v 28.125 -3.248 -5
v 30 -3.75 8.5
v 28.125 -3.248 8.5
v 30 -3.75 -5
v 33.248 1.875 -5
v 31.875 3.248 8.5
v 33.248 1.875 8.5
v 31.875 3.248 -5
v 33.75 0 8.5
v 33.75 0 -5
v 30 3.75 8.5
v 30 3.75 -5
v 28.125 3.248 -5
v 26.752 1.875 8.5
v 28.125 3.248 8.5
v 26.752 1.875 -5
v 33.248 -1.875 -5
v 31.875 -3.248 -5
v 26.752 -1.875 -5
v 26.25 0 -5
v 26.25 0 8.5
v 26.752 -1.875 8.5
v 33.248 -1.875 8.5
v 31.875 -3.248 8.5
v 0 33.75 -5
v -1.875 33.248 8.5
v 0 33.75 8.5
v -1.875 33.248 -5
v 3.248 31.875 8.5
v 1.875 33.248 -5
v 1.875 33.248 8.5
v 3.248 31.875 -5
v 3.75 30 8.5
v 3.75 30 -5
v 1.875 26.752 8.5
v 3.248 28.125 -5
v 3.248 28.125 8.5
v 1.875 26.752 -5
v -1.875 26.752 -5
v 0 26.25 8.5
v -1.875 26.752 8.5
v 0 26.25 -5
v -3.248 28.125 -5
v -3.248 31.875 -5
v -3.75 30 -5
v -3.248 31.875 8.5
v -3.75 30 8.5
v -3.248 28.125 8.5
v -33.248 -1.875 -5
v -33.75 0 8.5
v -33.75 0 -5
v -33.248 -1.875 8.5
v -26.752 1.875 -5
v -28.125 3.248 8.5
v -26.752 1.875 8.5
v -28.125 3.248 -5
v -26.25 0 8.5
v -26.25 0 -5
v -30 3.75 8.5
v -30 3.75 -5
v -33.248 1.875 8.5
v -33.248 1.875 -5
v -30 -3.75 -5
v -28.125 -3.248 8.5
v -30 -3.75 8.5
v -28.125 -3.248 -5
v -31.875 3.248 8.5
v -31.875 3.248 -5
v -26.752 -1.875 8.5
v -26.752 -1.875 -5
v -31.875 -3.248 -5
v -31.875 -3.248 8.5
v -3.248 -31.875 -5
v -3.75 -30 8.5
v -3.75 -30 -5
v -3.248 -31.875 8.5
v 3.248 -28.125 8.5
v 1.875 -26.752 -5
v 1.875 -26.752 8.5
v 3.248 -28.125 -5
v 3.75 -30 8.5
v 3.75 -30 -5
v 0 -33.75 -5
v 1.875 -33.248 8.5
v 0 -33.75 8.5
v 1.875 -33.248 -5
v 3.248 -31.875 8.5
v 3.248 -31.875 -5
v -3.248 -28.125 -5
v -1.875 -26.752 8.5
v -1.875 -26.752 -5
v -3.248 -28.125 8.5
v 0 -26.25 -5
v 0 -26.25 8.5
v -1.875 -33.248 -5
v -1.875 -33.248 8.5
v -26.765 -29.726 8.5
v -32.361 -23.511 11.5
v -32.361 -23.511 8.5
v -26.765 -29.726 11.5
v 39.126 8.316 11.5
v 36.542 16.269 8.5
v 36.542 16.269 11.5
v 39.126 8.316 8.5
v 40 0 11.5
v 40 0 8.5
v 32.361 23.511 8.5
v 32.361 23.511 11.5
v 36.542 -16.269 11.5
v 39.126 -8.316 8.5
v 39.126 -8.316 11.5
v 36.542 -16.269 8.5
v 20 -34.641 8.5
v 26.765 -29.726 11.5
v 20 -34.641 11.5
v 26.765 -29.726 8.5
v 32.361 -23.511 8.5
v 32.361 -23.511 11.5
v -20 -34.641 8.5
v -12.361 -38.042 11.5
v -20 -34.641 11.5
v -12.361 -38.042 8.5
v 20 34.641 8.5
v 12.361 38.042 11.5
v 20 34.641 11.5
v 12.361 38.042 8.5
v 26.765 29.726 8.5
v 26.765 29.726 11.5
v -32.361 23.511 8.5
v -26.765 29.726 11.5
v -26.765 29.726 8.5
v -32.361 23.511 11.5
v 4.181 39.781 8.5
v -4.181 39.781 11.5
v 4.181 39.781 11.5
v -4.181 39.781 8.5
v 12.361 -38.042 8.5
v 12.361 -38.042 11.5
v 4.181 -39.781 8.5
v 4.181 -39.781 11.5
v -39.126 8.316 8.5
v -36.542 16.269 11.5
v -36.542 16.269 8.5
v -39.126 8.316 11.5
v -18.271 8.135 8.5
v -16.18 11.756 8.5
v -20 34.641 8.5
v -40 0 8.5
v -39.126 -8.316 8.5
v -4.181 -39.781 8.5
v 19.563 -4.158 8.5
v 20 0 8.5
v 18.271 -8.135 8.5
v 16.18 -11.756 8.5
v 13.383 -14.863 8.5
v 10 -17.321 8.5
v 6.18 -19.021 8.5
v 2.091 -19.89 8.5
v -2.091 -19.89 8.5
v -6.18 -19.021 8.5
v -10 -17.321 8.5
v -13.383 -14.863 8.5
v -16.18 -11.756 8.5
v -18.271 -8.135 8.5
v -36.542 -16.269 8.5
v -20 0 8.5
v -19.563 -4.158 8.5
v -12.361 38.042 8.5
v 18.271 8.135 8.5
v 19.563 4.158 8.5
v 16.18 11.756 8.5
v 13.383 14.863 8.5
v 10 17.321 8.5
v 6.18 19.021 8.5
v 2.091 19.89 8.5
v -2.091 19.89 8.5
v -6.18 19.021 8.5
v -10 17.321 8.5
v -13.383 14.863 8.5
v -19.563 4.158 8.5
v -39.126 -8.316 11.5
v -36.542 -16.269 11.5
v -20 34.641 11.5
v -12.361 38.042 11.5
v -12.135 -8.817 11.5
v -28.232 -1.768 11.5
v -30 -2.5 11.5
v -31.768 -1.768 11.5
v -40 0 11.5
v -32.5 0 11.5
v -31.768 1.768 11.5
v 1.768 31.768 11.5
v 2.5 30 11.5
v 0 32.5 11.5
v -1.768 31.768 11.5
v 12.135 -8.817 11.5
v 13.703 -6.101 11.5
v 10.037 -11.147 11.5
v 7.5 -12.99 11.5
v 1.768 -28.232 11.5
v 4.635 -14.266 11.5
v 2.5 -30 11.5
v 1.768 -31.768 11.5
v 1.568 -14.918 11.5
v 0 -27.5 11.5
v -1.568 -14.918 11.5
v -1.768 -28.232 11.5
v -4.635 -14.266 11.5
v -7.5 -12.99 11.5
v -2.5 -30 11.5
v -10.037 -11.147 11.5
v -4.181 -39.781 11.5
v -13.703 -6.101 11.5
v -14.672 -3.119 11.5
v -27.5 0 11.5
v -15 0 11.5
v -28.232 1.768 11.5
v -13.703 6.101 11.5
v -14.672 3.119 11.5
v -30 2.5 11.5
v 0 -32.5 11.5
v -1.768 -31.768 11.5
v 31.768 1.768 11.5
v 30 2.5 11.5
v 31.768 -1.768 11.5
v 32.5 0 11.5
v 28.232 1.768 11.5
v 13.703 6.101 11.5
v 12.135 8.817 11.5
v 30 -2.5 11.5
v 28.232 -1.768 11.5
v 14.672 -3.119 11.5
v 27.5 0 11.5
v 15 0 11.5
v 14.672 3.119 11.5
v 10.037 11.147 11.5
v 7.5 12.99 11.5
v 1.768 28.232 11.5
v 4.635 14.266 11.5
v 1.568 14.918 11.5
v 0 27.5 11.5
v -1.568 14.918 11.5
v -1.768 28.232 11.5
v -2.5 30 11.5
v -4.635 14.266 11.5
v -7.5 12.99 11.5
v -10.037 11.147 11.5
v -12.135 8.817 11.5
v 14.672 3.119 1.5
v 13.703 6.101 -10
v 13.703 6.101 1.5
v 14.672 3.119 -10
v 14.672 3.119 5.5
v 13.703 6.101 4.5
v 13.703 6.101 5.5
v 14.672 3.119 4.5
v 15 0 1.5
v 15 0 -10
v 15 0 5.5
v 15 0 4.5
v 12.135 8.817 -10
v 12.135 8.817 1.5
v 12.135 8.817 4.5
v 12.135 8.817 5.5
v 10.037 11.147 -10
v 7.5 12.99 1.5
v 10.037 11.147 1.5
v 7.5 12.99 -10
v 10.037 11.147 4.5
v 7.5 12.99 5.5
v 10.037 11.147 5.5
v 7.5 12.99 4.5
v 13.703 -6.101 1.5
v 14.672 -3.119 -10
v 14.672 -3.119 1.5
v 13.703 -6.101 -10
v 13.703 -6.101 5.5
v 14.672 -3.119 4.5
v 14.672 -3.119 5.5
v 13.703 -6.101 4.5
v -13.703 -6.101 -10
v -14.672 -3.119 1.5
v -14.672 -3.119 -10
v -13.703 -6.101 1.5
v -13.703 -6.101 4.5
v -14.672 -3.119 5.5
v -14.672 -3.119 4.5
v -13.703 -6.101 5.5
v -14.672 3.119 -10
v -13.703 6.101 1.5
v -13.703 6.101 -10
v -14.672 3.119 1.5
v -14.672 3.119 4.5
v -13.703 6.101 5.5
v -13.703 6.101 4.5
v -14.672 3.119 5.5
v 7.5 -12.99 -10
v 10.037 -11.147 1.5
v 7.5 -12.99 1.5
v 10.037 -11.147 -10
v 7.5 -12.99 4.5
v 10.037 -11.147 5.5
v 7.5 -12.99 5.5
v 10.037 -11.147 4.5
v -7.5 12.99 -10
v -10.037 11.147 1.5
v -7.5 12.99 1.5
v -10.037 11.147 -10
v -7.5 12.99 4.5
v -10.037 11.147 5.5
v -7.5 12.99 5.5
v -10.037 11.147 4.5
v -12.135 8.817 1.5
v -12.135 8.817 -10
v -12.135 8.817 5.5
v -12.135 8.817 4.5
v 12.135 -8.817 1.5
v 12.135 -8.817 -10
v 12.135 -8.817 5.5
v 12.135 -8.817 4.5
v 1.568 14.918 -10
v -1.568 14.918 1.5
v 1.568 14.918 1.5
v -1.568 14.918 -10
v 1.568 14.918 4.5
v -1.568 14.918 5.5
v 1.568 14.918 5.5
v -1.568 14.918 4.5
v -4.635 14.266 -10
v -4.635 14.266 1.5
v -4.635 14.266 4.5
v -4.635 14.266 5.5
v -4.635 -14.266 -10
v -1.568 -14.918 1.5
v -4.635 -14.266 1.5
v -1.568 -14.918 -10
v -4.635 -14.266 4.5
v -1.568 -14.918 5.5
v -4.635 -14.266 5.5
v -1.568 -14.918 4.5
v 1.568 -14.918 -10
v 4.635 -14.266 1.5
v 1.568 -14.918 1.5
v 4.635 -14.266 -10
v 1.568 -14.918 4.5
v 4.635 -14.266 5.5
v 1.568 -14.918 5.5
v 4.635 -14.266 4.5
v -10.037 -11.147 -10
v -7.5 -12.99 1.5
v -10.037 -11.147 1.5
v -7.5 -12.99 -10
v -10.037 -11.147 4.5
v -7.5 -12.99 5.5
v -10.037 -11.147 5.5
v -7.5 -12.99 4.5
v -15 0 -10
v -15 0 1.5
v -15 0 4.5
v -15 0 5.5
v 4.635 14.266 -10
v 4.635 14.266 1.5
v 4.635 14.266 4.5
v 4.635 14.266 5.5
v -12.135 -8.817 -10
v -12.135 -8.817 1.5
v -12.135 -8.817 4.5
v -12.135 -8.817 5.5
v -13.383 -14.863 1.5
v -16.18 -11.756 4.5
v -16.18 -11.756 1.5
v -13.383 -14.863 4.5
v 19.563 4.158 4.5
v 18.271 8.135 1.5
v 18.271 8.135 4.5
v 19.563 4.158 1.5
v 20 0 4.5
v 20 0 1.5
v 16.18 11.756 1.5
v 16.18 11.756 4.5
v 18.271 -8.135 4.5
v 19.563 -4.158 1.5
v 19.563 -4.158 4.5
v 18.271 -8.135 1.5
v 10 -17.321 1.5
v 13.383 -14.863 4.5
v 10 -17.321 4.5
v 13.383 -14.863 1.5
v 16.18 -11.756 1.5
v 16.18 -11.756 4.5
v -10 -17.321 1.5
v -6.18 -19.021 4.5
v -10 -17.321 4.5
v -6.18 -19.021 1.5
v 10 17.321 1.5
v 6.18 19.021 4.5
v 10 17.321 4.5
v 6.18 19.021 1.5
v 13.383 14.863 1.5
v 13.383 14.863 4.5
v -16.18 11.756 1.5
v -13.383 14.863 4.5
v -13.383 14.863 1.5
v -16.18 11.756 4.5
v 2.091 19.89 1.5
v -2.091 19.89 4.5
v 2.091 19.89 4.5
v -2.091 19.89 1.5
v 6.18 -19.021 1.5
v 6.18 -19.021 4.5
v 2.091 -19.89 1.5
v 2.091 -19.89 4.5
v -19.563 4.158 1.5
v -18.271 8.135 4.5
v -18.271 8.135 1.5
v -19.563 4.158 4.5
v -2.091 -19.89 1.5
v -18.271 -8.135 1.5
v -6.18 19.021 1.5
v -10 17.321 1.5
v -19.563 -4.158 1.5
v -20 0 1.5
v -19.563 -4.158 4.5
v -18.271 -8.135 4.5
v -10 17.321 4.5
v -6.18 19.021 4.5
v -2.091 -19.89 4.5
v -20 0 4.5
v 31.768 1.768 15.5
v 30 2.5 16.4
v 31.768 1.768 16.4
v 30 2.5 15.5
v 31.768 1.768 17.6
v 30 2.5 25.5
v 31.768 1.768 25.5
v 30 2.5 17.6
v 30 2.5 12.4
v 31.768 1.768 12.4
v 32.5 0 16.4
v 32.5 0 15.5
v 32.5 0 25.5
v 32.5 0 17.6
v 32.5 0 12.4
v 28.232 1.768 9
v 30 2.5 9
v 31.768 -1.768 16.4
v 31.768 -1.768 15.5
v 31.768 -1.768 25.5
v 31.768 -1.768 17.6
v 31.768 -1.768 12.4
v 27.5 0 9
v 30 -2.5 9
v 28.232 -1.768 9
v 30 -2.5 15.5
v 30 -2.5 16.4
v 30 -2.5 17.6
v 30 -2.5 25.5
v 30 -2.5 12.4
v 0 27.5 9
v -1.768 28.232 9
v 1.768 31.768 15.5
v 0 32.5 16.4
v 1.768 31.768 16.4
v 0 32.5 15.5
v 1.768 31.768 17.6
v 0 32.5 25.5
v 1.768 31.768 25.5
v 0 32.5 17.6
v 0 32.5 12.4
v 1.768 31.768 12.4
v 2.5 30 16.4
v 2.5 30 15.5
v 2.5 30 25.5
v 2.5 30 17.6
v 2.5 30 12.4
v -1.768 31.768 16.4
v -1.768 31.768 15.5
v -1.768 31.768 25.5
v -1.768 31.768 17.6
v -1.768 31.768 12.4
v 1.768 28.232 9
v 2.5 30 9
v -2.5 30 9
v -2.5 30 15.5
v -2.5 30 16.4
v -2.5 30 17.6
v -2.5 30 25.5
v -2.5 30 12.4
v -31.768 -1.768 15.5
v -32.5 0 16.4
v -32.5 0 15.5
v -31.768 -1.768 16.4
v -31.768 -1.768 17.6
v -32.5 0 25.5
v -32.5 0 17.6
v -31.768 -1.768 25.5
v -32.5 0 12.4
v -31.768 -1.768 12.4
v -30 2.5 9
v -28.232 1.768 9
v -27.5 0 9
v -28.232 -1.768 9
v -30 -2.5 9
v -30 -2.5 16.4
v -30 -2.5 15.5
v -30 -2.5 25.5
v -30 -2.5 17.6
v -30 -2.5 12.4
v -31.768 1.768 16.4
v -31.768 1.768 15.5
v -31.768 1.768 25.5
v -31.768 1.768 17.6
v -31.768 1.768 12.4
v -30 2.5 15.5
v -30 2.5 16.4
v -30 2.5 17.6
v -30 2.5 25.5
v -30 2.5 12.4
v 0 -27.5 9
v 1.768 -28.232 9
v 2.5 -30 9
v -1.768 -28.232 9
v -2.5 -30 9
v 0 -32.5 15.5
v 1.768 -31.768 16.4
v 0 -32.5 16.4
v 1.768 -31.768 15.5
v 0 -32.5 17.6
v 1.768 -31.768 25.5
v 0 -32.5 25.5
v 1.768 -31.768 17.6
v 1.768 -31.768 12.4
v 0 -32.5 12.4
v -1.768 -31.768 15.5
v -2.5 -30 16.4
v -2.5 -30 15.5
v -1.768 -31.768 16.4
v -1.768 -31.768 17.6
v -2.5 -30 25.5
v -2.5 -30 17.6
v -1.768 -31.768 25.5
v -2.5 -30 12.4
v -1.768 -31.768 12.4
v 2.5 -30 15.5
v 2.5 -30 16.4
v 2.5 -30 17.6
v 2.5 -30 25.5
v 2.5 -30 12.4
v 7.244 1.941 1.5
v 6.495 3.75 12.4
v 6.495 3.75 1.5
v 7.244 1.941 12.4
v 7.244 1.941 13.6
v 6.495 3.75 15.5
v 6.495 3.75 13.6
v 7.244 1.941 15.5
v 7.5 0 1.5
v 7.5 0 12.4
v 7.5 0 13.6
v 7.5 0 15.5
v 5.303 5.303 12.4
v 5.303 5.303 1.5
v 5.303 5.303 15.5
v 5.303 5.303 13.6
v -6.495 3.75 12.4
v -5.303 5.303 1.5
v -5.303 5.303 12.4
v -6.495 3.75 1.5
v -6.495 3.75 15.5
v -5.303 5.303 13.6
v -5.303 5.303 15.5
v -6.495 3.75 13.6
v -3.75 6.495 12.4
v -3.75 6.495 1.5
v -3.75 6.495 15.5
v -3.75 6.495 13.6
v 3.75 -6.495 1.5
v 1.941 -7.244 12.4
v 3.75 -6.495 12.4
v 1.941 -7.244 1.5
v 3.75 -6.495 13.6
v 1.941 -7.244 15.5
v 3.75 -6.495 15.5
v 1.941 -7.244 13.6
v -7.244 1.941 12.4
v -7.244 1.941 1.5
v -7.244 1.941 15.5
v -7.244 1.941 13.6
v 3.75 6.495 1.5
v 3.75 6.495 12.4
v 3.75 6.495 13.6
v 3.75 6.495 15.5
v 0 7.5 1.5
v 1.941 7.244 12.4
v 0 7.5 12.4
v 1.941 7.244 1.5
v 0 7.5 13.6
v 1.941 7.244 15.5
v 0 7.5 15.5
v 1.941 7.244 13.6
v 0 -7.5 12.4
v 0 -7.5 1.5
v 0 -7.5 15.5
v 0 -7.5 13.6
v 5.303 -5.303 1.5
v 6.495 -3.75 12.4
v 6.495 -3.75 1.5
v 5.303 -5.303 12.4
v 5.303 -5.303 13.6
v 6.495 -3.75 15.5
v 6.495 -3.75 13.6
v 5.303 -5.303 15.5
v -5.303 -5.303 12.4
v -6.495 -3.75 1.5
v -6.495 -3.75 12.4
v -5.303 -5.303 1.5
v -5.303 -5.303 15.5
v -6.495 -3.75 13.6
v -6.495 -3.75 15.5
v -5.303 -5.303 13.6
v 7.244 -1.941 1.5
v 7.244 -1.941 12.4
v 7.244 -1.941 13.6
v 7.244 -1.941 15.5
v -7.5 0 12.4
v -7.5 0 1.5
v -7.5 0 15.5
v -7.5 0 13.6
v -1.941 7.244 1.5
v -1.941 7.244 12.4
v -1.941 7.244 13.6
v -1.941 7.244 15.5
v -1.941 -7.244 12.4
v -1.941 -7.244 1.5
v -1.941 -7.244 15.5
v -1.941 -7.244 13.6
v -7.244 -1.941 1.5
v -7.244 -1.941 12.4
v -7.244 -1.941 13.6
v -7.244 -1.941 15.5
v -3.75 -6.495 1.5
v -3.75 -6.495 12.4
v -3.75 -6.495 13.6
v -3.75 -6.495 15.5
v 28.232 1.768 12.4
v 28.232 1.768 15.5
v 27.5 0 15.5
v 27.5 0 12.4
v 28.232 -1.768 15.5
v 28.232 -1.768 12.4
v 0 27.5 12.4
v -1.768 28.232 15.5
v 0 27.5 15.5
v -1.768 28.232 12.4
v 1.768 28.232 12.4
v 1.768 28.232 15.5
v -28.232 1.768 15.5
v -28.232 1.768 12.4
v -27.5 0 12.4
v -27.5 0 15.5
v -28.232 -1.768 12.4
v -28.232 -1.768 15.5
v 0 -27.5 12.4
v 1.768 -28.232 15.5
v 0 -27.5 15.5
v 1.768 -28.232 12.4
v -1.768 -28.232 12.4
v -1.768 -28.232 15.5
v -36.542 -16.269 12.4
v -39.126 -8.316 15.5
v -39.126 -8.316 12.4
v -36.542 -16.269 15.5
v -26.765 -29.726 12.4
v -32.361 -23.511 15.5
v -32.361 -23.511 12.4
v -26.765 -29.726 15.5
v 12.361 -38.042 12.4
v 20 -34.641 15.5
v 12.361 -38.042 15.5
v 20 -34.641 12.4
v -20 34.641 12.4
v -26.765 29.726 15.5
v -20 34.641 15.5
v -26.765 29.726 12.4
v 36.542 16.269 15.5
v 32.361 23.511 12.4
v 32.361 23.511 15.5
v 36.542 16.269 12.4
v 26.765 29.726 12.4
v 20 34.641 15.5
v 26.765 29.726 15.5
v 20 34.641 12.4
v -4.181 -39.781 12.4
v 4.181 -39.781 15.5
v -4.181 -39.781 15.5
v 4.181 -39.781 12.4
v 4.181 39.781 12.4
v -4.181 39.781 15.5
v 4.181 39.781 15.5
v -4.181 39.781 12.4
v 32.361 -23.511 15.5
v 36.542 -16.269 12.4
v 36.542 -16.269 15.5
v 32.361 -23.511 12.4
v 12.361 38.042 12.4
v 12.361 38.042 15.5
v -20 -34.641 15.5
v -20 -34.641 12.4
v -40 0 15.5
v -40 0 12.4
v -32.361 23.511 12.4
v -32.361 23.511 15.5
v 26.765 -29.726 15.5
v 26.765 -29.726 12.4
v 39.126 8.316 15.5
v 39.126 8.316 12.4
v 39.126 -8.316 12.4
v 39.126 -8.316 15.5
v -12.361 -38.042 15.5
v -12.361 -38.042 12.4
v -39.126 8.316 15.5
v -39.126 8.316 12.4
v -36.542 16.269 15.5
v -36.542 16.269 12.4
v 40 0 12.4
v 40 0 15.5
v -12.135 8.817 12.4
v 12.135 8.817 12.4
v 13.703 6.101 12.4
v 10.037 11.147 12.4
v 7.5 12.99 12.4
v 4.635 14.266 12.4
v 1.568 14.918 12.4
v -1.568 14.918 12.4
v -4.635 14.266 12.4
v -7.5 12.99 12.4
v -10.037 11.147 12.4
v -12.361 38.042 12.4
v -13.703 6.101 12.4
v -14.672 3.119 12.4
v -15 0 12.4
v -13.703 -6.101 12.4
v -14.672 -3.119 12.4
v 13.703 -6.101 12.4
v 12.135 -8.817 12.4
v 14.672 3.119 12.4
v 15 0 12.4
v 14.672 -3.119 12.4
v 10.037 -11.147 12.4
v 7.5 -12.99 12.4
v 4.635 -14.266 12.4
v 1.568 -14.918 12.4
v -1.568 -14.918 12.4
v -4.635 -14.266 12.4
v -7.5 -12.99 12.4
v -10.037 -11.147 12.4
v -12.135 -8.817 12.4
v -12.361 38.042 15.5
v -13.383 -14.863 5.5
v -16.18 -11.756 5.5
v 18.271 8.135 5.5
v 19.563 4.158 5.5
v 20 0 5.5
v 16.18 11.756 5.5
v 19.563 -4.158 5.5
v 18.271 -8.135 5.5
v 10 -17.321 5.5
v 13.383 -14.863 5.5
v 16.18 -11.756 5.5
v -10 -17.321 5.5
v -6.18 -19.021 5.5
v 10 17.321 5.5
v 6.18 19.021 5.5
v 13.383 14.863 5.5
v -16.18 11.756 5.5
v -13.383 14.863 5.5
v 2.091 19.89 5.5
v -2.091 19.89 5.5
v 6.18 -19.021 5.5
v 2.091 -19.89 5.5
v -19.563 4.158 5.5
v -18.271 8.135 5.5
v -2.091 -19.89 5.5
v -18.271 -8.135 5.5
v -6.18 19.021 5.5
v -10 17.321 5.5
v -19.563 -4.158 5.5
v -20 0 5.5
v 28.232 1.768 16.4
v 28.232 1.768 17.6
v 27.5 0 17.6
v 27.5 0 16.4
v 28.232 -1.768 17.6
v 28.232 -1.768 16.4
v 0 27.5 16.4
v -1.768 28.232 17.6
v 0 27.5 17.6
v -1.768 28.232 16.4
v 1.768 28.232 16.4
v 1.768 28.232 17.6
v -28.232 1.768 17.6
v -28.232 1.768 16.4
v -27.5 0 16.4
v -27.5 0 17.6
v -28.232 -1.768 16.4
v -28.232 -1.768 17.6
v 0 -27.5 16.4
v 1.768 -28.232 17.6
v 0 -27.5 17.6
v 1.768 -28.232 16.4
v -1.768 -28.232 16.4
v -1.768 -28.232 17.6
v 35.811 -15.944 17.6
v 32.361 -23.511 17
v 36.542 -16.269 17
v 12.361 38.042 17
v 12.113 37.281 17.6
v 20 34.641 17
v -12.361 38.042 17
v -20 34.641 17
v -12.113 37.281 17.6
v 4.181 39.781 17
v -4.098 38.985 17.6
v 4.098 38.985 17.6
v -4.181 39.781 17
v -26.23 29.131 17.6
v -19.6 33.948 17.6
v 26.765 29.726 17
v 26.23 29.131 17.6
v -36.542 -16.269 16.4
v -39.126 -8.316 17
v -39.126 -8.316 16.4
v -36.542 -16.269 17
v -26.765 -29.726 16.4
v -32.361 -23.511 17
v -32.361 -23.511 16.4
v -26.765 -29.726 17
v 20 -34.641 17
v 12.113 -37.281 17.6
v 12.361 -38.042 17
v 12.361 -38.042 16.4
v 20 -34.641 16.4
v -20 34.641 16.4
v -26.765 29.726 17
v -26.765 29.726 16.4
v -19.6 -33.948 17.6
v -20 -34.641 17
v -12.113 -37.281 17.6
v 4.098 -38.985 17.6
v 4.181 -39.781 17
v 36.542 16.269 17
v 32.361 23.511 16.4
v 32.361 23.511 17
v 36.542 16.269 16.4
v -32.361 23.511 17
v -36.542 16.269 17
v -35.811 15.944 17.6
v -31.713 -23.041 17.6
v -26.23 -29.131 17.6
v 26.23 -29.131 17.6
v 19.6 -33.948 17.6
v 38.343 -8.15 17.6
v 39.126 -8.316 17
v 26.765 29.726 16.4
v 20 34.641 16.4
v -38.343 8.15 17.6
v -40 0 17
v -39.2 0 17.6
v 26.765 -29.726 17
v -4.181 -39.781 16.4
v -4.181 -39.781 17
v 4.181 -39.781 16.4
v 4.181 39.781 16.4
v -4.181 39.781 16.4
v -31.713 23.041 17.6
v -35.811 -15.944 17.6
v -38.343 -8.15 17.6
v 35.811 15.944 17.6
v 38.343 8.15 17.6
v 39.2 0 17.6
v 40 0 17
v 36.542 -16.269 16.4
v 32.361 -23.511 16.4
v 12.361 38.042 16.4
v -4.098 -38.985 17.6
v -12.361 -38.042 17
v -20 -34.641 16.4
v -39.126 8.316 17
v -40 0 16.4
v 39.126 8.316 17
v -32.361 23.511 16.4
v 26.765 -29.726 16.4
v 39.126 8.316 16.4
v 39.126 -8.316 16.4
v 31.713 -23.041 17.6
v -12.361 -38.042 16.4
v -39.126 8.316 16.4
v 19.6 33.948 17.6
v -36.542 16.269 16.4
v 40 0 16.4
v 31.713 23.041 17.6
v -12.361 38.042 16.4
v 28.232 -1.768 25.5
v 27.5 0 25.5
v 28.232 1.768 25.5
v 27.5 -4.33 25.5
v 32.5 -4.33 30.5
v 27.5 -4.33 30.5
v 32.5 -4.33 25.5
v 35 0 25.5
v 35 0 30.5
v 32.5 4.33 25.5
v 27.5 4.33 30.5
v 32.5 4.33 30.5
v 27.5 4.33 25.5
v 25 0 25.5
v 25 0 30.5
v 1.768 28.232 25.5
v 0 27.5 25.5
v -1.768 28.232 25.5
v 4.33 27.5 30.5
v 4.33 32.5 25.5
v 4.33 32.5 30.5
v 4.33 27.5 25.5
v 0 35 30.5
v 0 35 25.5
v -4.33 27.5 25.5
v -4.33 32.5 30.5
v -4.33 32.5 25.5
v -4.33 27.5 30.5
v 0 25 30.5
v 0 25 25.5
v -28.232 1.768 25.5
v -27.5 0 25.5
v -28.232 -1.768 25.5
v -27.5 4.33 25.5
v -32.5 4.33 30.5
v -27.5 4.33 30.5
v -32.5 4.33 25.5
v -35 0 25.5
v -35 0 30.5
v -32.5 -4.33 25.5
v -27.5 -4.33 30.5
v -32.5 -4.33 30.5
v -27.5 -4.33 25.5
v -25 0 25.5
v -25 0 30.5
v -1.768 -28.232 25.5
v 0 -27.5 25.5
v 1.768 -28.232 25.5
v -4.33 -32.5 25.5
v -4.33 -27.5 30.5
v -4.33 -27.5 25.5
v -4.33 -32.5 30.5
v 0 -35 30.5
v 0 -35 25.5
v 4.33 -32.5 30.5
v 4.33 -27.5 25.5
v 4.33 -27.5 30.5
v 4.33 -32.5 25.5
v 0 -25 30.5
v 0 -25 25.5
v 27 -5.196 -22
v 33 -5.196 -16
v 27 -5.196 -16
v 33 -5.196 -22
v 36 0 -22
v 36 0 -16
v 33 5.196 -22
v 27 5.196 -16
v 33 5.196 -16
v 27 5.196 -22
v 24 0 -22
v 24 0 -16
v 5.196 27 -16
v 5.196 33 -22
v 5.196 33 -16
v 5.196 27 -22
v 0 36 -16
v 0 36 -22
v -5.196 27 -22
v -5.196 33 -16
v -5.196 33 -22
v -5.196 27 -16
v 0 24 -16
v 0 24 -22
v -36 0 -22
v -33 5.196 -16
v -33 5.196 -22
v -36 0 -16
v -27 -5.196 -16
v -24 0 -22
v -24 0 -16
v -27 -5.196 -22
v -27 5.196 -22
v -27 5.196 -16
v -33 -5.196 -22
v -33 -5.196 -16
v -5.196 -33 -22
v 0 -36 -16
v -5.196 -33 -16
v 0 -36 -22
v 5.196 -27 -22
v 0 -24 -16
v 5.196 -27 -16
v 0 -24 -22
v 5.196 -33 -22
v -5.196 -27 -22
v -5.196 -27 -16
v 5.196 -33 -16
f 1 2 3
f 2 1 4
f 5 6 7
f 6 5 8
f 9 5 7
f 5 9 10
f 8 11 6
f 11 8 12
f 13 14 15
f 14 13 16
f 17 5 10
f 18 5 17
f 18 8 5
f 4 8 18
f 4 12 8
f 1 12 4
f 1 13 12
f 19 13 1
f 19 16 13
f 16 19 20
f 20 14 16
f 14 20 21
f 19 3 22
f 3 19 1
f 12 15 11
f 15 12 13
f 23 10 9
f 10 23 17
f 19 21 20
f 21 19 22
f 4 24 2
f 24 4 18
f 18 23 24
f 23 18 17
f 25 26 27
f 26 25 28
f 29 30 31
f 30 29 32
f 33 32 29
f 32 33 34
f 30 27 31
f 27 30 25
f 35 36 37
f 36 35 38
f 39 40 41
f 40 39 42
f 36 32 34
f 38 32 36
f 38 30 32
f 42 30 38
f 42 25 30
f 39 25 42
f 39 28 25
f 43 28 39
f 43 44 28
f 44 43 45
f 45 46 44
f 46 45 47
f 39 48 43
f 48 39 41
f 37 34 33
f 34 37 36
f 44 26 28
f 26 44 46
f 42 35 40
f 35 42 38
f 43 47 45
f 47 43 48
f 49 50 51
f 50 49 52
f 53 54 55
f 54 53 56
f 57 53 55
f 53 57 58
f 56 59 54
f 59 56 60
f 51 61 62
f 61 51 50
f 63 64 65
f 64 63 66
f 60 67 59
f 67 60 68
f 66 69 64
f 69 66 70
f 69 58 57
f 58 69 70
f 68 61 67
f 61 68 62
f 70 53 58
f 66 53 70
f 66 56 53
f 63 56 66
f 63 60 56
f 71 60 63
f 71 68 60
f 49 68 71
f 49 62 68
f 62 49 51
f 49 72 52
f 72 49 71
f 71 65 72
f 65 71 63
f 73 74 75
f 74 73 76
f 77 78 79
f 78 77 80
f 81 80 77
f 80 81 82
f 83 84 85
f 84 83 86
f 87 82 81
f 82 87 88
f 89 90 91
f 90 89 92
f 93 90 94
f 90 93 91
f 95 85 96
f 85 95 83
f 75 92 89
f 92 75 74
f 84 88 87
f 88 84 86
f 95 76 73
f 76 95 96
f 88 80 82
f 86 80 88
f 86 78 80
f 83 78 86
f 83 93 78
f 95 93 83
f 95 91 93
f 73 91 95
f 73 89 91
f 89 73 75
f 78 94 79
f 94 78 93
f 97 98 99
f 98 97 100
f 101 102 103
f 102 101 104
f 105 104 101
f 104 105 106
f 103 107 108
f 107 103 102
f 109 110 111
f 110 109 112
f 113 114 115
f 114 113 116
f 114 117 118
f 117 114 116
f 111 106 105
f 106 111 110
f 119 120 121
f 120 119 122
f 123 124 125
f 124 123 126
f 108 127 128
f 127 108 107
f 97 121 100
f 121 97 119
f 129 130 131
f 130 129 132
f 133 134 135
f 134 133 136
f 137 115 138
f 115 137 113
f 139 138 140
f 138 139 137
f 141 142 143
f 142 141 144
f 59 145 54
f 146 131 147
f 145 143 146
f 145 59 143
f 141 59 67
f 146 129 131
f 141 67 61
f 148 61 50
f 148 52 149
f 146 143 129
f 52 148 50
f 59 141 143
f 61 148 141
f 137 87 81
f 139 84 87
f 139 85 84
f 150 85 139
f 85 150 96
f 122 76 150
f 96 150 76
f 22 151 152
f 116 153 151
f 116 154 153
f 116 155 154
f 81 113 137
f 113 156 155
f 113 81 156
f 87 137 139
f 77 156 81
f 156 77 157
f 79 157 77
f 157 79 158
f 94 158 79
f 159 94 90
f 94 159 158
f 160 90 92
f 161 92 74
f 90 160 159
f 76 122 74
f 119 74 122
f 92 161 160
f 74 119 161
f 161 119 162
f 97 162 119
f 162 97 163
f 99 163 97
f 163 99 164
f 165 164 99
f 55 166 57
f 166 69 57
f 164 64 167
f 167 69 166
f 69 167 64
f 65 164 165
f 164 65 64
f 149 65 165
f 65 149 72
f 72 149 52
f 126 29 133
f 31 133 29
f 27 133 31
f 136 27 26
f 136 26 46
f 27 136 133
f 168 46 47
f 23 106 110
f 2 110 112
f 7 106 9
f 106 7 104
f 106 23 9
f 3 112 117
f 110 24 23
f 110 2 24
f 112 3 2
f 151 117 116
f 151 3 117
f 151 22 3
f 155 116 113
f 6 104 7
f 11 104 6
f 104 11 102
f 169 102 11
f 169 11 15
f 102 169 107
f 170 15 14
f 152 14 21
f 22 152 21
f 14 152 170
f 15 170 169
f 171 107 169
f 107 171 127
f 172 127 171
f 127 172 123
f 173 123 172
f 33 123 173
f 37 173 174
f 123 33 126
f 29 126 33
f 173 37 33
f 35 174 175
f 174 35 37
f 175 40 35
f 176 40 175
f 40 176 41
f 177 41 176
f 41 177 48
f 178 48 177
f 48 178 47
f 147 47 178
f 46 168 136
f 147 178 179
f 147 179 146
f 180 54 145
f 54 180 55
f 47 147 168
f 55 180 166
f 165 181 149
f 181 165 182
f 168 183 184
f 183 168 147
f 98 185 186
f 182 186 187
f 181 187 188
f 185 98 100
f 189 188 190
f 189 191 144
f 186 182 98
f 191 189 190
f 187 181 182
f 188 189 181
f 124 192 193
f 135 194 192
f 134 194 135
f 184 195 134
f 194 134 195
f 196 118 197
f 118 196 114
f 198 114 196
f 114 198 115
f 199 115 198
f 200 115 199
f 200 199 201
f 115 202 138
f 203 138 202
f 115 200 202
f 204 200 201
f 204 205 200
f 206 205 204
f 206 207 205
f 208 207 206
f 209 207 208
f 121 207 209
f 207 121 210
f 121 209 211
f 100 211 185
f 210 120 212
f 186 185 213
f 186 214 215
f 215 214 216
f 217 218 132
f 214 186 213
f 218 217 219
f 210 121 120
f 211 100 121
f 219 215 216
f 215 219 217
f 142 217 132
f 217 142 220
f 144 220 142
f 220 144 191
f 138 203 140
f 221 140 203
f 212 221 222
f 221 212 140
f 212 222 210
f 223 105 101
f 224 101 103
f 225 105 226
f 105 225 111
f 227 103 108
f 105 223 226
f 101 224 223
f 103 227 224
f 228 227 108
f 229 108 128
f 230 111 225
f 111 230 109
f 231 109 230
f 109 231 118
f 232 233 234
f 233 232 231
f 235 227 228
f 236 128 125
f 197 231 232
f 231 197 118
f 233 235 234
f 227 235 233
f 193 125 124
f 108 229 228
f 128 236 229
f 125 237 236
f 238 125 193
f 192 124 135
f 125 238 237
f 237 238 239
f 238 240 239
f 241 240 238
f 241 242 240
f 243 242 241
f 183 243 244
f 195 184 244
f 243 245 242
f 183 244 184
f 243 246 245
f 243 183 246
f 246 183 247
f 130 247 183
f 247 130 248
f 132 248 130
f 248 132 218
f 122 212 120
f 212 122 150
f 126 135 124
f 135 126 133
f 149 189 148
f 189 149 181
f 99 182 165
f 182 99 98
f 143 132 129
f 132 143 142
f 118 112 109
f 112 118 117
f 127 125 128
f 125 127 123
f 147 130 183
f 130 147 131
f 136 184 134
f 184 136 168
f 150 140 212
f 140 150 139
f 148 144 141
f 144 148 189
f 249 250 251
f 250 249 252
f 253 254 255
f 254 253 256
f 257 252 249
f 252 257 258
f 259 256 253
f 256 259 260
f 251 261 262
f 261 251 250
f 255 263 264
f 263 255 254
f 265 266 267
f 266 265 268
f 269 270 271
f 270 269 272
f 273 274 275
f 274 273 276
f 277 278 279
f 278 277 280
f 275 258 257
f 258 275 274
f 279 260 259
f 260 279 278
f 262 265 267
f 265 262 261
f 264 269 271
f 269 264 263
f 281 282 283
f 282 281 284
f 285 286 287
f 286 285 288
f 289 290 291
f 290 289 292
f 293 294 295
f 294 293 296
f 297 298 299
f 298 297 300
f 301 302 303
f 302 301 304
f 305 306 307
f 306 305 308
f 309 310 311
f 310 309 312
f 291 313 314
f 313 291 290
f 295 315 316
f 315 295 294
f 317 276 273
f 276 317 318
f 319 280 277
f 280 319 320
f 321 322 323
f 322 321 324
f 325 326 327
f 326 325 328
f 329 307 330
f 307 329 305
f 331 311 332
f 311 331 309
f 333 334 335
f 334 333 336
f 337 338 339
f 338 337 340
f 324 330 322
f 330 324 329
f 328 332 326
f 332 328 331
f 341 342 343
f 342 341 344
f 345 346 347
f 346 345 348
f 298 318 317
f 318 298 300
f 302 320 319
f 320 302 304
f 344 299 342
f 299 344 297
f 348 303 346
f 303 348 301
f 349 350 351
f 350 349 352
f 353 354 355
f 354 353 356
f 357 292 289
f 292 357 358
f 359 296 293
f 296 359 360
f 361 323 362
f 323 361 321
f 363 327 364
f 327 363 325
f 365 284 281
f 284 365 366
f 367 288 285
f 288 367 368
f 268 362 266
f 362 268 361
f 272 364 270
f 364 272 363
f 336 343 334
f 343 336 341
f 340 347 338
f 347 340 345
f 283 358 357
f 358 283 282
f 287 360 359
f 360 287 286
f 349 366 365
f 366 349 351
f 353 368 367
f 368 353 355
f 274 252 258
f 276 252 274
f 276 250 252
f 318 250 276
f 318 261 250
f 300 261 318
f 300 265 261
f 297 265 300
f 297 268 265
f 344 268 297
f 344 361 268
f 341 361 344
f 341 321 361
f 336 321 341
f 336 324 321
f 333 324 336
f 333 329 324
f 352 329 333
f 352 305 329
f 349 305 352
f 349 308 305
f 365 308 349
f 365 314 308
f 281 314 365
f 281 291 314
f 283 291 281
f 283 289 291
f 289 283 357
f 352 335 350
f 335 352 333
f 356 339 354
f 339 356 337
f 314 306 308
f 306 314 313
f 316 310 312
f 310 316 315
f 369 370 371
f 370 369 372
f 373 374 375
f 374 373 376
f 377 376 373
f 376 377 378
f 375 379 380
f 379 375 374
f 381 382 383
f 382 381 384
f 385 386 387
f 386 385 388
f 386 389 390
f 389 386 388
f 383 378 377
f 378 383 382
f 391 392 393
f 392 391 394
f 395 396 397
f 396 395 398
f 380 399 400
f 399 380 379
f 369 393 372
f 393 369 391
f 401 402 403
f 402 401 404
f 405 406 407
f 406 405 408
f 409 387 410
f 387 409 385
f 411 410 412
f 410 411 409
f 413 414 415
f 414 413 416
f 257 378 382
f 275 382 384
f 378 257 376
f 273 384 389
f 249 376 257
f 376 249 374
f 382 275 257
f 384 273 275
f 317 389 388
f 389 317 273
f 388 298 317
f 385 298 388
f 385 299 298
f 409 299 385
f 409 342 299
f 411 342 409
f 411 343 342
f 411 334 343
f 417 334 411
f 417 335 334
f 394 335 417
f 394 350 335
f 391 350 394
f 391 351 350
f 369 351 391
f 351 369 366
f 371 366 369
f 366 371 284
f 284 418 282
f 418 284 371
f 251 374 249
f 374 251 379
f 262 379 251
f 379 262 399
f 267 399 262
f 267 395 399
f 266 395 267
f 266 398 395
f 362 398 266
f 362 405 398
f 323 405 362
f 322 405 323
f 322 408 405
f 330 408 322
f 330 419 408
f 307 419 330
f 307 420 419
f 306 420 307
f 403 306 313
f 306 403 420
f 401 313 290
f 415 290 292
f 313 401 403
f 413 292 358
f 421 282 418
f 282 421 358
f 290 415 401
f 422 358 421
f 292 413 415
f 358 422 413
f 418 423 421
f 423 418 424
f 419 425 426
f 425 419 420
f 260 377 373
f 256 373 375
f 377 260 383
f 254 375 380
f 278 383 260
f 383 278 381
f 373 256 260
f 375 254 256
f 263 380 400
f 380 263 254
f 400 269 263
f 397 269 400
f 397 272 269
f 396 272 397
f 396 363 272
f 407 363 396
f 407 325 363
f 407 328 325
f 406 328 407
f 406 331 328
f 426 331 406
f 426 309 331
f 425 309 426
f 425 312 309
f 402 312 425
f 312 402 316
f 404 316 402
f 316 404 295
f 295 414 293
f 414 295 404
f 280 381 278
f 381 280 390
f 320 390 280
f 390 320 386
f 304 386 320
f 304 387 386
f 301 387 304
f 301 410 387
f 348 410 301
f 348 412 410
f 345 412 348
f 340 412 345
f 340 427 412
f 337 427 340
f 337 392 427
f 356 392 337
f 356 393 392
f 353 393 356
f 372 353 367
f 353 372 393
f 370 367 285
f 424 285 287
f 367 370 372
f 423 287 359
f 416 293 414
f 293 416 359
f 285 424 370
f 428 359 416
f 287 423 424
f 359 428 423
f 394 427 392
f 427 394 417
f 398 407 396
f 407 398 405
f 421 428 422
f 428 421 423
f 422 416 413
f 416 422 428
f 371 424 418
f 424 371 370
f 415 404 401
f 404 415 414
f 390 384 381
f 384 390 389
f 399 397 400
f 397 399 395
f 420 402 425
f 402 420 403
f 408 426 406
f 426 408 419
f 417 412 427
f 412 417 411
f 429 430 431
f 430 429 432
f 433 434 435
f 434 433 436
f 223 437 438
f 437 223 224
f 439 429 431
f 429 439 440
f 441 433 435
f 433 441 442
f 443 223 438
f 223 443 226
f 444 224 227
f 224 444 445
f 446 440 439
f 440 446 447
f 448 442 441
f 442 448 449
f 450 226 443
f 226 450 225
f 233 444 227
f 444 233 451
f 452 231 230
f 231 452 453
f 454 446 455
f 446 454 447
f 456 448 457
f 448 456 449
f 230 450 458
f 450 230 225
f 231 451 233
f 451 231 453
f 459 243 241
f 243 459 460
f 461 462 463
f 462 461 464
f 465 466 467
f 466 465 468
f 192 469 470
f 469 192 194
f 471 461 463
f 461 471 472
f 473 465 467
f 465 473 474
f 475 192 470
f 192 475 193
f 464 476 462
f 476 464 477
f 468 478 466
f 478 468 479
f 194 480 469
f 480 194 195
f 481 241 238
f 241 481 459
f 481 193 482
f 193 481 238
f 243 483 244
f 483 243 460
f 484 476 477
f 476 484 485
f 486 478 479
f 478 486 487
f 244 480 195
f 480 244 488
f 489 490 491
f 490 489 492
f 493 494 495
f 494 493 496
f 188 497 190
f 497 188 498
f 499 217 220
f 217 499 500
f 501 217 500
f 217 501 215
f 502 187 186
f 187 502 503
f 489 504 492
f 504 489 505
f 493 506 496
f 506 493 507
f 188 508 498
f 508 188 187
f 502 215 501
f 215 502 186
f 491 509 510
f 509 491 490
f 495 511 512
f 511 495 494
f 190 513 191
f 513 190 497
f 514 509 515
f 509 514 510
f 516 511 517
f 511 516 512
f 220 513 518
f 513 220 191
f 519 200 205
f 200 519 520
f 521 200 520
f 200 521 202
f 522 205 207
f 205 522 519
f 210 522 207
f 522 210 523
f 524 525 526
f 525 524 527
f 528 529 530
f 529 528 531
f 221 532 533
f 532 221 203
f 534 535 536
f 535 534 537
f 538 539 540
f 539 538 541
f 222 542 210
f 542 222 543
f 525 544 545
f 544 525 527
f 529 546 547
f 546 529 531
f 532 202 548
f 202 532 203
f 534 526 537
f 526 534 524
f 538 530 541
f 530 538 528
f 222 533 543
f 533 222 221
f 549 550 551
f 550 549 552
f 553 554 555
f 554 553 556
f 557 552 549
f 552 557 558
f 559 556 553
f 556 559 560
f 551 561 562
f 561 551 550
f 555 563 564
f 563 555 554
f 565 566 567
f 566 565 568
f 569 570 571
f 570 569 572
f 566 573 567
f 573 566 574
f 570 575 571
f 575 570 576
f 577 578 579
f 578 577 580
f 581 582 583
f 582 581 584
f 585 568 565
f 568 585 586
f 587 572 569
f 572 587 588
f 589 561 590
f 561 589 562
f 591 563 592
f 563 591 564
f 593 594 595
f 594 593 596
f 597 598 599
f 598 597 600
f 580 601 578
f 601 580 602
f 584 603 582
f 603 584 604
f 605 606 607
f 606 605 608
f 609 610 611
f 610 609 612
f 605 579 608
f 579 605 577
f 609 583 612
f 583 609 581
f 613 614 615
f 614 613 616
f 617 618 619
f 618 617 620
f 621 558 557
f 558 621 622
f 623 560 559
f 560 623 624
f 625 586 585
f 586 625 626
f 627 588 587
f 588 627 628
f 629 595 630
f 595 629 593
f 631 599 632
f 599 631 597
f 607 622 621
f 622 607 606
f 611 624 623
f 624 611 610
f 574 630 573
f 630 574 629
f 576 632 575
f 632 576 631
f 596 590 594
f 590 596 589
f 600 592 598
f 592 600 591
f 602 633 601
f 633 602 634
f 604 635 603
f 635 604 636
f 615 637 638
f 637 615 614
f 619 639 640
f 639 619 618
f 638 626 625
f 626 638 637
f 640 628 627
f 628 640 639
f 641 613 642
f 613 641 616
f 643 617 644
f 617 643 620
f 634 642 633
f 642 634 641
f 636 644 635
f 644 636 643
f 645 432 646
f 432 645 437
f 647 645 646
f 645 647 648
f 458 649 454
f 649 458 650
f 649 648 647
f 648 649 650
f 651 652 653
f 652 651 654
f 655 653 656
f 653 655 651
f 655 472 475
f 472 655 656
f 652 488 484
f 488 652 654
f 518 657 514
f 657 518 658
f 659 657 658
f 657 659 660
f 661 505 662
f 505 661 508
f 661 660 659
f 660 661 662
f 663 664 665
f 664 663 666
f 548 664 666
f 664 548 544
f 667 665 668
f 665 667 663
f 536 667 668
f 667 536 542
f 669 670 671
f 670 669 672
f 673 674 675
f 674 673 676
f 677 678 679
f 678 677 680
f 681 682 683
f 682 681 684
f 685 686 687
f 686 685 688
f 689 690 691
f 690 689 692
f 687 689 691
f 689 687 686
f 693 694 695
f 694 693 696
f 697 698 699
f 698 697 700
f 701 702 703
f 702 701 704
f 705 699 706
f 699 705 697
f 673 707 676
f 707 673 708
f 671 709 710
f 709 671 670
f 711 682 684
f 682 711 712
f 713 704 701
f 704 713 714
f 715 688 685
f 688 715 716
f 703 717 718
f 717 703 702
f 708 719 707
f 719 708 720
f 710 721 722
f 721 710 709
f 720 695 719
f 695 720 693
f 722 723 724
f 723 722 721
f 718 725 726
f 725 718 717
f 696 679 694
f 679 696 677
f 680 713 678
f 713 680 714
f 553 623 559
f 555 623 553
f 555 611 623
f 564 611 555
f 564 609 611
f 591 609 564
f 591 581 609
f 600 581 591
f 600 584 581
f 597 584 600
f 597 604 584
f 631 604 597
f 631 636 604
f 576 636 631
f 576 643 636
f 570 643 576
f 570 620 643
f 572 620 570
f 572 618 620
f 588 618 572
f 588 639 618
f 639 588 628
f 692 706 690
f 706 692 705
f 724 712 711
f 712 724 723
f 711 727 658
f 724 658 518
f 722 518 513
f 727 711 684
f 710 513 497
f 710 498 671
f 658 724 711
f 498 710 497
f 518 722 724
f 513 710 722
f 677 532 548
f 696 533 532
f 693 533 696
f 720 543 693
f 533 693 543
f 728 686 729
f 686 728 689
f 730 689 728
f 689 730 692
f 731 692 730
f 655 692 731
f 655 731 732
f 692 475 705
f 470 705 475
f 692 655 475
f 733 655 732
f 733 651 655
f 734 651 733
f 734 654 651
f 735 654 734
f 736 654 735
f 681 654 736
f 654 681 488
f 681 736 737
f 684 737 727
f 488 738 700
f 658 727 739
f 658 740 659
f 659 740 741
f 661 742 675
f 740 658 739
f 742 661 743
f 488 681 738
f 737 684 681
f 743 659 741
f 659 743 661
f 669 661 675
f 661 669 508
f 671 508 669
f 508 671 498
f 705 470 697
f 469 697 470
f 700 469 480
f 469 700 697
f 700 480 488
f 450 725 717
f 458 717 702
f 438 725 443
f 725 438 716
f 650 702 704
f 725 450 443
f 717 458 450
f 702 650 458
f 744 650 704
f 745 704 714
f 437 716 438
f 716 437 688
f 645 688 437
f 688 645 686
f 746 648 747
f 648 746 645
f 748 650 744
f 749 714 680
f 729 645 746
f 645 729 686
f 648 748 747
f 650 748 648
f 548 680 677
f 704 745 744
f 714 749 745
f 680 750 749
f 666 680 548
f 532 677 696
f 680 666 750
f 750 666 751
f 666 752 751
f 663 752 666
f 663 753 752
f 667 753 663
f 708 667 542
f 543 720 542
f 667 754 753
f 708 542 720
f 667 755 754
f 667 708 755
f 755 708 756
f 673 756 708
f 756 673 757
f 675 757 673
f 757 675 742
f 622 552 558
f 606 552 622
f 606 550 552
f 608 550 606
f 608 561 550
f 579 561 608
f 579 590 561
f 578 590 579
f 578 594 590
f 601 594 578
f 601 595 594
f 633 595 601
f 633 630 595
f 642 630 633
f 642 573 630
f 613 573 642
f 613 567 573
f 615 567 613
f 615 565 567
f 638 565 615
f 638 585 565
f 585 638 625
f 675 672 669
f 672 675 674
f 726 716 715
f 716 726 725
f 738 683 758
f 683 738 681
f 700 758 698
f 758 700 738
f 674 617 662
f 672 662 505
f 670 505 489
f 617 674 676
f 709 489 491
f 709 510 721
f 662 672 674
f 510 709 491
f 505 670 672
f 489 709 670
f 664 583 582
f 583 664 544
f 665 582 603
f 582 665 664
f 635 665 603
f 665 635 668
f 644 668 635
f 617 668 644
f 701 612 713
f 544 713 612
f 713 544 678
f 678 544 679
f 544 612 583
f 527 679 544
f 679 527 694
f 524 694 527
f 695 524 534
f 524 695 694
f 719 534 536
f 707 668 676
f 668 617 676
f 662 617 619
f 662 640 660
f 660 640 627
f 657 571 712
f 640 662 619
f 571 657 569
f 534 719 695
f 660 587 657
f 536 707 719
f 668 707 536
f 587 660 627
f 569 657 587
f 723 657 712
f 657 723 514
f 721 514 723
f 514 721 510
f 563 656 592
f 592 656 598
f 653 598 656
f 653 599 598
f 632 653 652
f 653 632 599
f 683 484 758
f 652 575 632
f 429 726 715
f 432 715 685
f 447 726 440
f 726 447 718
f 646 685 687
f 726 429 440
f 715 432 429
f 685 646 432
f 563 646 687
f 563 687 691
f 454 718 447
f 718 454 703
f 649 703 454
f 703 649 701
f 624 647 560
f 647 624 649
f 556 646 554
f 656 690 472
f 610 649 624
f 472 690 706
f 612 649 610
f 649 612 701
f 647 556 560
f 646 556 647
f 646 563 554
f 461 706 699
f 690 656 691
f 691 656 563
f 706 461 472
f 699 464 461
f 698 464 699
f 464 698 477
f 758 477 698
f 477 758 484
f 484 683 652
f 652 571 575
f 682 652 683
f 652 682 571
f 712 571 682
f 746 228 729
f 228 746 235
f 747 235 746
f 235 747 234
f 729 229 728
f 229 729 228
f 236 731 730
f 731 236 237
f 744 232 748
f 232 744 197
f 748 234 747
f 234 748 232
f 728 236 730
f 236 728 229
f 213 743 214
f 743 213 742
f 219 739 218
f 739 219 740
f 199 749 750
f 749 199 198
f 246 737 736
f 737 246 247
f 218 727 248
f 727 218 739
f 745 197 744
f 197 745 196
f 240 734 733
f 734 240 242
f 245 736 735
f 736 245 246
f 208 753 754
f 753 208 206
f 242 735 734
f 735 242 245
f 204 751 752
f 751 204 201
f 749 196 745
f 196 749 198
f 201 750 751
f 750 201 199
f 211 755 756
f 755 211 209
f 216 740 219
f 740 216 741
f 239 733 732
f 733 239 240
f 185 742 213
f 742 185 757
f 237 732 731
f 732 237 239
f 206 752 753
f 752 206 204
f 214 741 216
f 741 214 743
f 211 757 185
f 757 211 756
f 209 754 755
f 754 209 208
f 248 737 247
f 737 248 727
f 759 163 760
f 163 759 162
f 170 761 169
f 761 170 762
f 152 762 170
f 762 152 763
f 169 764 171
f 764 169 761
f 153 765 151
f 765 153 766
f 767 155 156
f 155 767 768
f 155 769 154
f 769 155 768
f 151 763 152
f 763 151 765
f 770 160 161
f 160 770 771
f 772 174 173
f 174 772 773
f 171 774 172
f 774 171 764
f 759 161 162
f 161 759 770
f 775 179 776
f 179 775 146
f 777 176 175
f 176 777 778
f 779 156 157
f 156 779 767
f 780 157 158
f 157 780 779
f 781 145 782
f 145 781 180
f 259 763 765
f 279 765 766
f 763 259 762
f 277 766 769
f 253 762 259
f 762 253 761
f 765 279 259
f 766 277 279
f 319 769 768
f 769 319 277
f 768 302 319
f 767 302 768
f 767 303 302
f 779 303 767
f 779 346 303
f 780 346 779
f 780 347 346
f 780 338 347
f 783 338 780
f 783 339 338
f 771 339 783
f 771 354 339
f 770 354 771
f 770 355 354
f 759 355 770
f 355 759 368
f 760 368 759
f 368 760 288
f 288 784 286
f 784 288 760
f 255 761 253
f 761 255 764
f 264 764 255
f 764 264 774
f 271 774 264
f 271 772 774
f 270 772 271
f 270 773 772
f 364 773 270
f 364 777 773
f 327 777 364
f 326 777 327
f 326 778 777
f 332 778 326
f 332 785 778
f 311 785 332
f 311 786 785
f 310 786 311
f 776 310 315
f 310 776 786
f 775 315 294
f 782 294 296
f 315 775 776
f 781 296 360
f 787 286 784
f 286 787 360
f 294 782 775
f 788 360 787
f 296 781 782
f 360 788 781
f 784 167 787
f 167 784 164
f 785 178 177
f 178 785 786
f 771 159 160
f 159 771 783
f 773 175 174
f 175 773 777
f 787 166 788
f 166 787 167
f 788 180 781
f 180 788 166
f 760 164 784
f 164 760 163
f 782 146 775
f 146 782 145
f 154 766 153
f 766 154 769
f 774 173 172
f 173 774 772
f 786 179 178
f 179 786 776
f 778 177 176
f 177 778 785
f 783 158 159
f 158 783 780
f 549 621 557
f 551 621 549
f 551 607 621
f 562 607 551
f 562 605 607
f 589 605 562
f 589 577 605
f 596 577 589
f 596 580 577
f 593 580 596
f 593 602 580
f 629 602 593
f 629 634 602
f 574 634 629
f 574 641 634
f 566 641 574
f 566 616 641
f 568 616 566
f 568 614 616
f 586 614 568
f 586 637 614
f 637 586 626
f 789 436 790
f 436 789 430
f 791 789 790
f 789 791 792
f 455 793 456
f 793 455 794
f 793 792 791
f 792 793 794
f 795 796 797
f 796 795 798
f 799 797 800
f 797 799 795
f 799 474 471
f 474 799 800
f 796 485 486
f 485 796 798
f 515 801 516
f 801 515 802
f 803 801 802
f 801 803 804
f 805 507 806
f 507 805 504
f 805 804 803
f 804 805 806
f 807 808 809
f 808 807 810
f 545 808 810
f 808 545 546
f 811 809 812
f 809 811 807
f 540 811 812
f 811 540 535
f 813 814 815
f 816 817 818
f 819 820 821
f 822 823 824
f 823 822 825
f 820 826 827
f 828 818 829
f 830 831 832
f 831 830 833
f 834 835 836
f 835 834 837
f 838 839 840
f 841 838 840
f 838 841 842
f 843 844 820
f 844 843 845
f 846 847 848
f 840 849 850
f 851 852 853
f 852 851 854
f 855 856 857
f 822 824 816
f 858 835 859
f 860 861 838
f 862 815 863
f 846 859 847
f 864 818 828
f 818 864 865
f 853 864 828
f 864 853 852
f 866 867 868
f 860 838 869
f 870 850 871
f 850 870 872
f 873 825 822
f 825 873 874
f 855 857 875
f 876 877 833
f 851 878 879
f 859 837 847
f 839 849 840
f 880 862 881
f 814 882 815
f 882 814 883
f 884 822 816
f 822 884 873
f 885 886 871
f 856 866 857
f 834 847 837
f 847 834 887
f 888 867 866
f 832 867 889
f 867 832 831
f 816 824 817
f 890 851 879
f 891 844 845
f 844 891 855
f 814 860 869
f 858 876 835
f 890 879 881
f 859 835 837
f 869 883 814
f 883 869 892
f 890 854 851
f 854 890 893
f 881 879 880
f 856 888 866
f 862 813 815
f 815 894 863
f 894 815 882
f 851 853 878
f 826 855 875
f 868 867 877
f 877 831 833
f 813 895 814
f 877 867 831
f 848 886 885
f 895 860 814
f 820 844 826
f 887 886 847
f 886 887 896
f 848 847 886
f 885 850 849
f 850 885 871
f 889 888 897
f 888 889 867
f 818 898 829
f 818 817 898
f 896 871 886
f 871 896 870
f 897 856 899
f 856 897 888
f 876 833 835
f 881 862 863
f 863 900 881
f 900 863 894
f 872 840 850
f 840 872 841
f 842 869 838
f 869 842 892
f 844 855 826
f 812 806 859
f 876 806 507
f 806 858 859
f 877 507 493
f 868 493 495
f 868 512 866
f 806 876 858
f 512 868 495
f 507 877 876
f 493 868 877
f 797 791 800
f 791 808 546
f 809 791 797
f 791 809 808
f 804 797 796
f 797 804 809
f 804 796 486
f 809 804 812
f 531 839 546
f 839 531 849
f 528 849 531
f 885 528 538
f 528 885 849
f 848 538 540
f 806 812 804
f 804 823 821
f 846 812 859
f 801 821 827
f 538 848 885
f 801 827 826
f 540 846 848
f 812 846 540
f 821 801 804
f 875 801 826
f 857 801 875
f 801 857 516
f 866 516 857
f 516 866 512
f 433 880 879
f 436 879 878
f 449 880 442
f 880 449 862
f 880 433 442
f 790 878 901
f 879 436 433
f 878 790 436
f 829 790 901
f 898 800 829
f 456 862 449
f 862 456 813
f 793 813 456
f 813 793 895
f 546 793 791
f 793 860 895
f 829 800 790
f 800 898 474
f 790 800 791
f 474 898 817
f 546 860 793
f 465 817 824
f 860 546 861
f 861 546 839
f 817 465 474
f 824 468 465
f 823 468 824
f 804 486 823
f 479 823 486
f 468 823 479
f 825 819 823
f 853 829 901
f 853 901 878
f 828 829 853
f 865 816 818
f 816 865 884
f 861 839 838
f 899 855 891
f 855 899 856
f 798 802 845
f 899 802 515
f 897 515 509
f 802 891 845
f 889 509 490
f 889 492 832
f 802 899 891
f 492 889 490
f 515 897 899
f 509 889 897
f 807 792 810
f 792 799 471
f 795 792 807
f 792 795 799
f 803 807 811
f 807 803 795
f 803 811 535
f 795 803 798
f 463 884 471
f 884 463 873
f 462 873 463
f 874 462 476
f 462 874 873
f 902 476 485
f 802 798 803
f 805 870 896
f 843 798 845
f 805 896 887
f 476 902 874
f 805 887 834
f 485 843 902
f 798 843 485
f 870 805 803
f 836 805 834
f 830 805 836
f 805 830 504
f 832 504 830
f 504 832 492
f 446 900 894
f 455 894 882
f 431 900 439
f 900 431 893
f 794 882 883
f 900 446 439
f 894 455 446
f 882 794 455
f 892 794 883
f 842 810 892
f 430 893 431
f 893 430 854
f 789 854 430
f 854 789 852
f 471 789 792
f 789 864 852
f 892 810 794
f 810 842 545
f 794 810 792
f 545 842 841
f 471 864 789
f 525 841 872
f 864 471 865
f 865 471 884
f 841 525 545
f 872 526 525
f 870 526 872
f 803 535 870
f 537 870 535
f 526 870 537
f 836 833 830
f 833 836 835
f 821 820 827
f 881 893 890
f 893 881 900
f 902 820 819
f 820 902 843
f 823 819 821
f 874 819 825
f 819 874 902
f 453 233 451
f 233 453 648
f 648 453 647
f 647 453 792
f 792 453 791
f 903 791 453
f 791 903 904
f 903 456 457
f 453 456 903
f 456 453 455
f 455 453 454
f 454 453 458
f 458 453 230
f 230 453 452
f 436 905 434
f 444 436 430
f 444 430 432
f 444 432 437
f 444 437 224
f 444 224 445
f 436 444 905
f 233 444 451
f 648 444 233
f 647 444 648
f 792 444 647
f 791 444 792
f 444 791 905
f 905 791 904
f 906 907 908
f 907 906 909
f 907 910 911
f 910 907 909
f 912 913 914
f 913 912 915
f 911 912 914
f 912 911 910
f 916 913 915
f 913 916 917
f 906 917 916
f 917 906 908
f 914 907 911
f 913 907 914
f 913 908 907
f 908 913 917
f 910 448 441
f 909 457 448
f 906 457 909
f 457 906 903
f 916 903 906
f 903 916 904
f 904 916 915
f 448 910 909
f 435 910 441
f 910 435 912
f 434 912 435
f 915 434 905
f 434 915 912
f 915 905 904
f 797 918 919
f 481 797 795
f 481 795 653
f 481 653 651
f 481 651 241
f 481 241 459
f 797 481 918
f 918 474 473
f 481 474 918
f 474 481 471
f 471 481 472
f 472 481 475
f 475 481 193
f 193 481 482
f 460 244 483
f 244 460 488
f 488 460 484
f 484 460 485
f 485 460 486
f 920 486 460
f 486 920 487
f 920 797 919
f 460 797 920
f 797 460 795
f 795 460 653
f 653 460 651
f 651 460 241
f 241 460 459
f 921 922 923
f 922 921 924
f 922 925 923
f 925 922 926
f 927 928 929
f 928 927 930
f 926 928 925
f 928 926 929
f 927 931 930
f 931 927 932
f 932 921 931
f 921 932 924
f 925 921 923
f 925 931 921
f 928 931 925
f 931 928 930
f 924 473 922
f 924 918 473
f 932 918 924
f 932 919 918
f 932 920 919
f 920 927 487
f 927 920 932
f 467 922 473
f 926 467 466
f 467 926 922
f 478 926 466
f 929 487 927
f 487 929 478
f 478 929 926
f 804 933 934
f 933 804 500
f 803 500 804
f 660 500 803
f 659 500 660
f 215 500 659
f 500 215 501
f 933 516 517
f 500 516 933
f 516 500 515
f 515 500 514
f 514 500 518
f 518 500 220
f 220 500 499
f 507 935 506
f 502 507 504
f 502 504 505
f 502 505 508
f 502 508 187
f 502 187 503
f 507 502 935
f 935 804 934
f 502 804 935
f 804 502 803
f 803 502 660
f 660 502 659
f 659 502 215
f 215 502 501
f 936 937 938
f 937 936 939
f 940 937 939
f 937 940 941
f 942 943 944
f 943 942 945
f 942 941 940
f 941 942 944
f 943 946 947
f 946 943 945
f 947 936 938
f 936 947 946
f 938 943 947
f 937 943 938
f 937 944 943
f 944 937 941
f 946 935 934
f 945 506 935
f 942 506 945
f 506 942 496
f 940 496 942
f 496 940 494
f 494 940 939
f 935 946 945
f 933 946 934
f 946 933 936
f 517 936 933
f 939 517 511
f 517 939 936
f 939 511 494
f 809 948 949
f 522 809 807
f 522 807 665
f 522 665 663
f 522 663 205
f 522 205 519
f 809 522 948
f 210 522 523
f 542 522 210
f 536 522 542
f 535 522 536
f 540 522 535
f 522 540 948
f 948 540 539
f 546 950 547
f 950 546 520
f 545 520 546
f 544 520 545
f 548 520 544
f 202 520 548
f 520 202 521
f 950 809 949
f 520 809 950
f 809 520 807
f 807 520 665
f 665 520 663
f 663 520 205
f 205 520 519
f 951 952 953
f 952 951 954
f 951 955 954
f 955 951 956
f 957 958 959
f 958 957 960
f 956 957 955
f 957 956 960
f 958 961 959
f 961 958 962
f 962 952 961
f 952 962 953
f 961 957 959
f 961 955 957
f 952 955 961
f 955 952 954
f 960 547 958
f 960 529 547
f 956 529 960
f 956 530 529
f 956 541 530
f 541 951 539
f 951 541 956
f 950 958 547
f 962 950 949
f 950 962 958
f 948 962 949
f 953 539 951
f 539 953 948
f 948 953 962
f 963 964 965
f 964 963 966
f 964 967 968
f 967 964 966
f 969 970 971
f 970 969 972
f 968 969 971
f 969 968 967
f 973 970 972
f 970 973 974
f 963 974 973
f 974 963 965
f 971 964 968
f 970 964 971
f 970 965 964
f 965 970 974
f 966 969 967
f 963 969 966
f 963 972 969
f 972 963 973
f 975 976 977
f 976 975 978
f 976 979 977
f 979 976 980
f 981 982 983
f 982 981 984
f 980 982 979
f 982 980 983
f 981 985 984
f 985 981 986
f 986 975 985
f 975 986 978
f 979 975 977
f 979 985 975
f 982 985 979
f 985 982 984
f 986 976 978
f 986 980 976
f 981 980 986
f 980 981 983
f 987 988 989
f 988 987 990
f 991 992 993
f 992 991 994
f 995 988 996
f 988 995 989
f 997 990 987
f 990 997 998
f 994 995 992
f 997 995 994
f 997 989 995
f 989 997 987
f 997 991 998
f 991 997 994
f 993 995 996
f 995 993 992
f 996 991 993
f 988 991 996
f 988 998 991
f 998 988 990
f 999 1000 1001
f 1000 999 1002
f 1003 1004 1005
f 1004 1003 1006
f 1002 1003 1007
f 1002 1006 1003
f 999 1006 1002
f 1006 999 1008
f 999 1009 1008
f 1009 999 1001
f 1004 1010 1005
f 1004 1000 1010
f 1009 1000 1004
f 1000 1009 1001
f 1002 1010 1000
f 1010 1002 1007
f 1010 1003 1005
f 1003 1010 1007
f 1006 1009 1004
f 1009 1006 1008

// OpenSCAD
// Parameters
flange_diameter = 80;
flange_thickness = 3; // Reduced thickness for accuracy
hub_diameter = 30;
hub_length = 20;
shaft_hole_diameter = 15;
bolt_hole_diameter = 5;
bolt_circle_diameter = 60;
bolt_length = 30; // Increased length for better accuracy
bolt_head_diameter = 10; // More defined hexagonal head
bolt_head_height = 5;
nut_diameter = 12; // Adjusted for better fit
nut_thickness = 6;
num_bolts = 4;
hub_recess_depth = 3;
hub_recess_diameter = 40;

// Function to create a flange hub with additional structural details
module flange_hub() {
    difference() {
        union() {
            // Flange with refined thickness
            cylinder(h=flange_thickness, d=flange_diameter, center=true);
            
            // Hub with refined cutouts
            translate([0, 0, -hub_length/2])
                cylinder(h=hub_length, d=hub_diameter, center=true);
            
            // Additional recess for structural refinement
            translate([0, 0, -hub_length/2 + hub_recess_depth])
                cylinder(h=hub_recess_depth, d=hub_recess_diameter, center=true);
            
            // Adding cutout details to match the original model
            for (i = [0:num_bolts-1]) {
                angle = i * 360 / num_bolts;
                translate([bolt_circle_diameter/2 * cos(angle), bolt_circle_diameter/2 * sin(angle), -hub_length/2])
                    cylinder(h=hub_length/2, d=bolt_hole_diameter * 1.5, center=true);
            }
        }
        
        // Shaft hole
        cylinder(h=hub_length + flange_thickness + 2, d=shaft_hole_diameter, center=true);
        
        // Bolt holes
        for (i = [0:num_bolts-1]) {
            angle = i * 360 / num_bolts;
            translate([bolt_circle_diameter/2 * cos(angle), bolt_circle_diameter/2 * sin(angle), 0])
                cylinder(h=flange_thickness + 2, d=bolt_hole_diameter, center=true);
        }
    }
}

// Function to create a diaphragm with curvature and integration refinements
module diaphragm() {
    difference() {
        // Thinner diaphragm for better flexibility
        hull() {
            translate([0, 0, -0.3])
                cylinder(h=0.6, d=flange_diameter, center=true);
            translate([0, 0, 0.3])
                cylinder(h=0.6, d=flange_diameter * 0.98, center=true);
        }
        
        // Bolt holes with better alignment
        for (i = [0:num_bolts-1]) {
            angle = i * 360 / num_bolts;
            translate([bolt_circle_diameter/2 * cos(angle), bolt_circle_diameter/2 * sin(angle), 0])
                cylinder(h=3, d=bolt_hole_diameter, center=true);
        }
    }
}

// Function to create a properly aligned bolt with hexagonal head
module bolt() {
    union() {
        // Bolt shaft
        cylinder(h=bolt_length, d=bolt_hole_diameter, center=true);
        
        // Hexagonal bolt head
        translate([0, 0, bolt_length/2])
            cylinder(h=bolt_head_height, d=bolt_head_diameter, $fn=6, center=true);
    }
}

// Function to create a properly aligned hexagonal nut
module nut() {
    cylinder(h=nut_thickness, d=nut_diameter, $fn=6, center=true);
}

// Assembly with corrected bolt and nut alignment
module coupling() {
    translate([0, 0, hub_length/2])
        flange_hub();
    
    translate([0, 0, hub_length/2 + flange_thickness])
        diaphragm();
    
    translate([0, 0, hub_length/2 + flange_thickness + 1])
        flange_hub();
    
    translate([0, 0, hub_length/2 + flange_thickness * 2 + 1])
        diaphragm();

    // Bolts and nuts correctly positioned
    for (i = [0:num_bolts-1]) {
        angle = i * 360 / num_bolts;
        translate([bolt_circle_diameter/2 * cos(angle), bolt_circle_diameter/2 * sin(angle), hub_length/2 + flange_thickness])
            rotate([0, 0, angle])
                bolt();
        
        translate([bolt_circle_diameter/2 * cos(angle), bolt_circle_diameter/2 * sin(angle), -hub_length/2 - flange_thickness - nut_thickness])
            rotate([0, 0, angle])
                nut();
    }
}

// Render the coupling
coupling();
